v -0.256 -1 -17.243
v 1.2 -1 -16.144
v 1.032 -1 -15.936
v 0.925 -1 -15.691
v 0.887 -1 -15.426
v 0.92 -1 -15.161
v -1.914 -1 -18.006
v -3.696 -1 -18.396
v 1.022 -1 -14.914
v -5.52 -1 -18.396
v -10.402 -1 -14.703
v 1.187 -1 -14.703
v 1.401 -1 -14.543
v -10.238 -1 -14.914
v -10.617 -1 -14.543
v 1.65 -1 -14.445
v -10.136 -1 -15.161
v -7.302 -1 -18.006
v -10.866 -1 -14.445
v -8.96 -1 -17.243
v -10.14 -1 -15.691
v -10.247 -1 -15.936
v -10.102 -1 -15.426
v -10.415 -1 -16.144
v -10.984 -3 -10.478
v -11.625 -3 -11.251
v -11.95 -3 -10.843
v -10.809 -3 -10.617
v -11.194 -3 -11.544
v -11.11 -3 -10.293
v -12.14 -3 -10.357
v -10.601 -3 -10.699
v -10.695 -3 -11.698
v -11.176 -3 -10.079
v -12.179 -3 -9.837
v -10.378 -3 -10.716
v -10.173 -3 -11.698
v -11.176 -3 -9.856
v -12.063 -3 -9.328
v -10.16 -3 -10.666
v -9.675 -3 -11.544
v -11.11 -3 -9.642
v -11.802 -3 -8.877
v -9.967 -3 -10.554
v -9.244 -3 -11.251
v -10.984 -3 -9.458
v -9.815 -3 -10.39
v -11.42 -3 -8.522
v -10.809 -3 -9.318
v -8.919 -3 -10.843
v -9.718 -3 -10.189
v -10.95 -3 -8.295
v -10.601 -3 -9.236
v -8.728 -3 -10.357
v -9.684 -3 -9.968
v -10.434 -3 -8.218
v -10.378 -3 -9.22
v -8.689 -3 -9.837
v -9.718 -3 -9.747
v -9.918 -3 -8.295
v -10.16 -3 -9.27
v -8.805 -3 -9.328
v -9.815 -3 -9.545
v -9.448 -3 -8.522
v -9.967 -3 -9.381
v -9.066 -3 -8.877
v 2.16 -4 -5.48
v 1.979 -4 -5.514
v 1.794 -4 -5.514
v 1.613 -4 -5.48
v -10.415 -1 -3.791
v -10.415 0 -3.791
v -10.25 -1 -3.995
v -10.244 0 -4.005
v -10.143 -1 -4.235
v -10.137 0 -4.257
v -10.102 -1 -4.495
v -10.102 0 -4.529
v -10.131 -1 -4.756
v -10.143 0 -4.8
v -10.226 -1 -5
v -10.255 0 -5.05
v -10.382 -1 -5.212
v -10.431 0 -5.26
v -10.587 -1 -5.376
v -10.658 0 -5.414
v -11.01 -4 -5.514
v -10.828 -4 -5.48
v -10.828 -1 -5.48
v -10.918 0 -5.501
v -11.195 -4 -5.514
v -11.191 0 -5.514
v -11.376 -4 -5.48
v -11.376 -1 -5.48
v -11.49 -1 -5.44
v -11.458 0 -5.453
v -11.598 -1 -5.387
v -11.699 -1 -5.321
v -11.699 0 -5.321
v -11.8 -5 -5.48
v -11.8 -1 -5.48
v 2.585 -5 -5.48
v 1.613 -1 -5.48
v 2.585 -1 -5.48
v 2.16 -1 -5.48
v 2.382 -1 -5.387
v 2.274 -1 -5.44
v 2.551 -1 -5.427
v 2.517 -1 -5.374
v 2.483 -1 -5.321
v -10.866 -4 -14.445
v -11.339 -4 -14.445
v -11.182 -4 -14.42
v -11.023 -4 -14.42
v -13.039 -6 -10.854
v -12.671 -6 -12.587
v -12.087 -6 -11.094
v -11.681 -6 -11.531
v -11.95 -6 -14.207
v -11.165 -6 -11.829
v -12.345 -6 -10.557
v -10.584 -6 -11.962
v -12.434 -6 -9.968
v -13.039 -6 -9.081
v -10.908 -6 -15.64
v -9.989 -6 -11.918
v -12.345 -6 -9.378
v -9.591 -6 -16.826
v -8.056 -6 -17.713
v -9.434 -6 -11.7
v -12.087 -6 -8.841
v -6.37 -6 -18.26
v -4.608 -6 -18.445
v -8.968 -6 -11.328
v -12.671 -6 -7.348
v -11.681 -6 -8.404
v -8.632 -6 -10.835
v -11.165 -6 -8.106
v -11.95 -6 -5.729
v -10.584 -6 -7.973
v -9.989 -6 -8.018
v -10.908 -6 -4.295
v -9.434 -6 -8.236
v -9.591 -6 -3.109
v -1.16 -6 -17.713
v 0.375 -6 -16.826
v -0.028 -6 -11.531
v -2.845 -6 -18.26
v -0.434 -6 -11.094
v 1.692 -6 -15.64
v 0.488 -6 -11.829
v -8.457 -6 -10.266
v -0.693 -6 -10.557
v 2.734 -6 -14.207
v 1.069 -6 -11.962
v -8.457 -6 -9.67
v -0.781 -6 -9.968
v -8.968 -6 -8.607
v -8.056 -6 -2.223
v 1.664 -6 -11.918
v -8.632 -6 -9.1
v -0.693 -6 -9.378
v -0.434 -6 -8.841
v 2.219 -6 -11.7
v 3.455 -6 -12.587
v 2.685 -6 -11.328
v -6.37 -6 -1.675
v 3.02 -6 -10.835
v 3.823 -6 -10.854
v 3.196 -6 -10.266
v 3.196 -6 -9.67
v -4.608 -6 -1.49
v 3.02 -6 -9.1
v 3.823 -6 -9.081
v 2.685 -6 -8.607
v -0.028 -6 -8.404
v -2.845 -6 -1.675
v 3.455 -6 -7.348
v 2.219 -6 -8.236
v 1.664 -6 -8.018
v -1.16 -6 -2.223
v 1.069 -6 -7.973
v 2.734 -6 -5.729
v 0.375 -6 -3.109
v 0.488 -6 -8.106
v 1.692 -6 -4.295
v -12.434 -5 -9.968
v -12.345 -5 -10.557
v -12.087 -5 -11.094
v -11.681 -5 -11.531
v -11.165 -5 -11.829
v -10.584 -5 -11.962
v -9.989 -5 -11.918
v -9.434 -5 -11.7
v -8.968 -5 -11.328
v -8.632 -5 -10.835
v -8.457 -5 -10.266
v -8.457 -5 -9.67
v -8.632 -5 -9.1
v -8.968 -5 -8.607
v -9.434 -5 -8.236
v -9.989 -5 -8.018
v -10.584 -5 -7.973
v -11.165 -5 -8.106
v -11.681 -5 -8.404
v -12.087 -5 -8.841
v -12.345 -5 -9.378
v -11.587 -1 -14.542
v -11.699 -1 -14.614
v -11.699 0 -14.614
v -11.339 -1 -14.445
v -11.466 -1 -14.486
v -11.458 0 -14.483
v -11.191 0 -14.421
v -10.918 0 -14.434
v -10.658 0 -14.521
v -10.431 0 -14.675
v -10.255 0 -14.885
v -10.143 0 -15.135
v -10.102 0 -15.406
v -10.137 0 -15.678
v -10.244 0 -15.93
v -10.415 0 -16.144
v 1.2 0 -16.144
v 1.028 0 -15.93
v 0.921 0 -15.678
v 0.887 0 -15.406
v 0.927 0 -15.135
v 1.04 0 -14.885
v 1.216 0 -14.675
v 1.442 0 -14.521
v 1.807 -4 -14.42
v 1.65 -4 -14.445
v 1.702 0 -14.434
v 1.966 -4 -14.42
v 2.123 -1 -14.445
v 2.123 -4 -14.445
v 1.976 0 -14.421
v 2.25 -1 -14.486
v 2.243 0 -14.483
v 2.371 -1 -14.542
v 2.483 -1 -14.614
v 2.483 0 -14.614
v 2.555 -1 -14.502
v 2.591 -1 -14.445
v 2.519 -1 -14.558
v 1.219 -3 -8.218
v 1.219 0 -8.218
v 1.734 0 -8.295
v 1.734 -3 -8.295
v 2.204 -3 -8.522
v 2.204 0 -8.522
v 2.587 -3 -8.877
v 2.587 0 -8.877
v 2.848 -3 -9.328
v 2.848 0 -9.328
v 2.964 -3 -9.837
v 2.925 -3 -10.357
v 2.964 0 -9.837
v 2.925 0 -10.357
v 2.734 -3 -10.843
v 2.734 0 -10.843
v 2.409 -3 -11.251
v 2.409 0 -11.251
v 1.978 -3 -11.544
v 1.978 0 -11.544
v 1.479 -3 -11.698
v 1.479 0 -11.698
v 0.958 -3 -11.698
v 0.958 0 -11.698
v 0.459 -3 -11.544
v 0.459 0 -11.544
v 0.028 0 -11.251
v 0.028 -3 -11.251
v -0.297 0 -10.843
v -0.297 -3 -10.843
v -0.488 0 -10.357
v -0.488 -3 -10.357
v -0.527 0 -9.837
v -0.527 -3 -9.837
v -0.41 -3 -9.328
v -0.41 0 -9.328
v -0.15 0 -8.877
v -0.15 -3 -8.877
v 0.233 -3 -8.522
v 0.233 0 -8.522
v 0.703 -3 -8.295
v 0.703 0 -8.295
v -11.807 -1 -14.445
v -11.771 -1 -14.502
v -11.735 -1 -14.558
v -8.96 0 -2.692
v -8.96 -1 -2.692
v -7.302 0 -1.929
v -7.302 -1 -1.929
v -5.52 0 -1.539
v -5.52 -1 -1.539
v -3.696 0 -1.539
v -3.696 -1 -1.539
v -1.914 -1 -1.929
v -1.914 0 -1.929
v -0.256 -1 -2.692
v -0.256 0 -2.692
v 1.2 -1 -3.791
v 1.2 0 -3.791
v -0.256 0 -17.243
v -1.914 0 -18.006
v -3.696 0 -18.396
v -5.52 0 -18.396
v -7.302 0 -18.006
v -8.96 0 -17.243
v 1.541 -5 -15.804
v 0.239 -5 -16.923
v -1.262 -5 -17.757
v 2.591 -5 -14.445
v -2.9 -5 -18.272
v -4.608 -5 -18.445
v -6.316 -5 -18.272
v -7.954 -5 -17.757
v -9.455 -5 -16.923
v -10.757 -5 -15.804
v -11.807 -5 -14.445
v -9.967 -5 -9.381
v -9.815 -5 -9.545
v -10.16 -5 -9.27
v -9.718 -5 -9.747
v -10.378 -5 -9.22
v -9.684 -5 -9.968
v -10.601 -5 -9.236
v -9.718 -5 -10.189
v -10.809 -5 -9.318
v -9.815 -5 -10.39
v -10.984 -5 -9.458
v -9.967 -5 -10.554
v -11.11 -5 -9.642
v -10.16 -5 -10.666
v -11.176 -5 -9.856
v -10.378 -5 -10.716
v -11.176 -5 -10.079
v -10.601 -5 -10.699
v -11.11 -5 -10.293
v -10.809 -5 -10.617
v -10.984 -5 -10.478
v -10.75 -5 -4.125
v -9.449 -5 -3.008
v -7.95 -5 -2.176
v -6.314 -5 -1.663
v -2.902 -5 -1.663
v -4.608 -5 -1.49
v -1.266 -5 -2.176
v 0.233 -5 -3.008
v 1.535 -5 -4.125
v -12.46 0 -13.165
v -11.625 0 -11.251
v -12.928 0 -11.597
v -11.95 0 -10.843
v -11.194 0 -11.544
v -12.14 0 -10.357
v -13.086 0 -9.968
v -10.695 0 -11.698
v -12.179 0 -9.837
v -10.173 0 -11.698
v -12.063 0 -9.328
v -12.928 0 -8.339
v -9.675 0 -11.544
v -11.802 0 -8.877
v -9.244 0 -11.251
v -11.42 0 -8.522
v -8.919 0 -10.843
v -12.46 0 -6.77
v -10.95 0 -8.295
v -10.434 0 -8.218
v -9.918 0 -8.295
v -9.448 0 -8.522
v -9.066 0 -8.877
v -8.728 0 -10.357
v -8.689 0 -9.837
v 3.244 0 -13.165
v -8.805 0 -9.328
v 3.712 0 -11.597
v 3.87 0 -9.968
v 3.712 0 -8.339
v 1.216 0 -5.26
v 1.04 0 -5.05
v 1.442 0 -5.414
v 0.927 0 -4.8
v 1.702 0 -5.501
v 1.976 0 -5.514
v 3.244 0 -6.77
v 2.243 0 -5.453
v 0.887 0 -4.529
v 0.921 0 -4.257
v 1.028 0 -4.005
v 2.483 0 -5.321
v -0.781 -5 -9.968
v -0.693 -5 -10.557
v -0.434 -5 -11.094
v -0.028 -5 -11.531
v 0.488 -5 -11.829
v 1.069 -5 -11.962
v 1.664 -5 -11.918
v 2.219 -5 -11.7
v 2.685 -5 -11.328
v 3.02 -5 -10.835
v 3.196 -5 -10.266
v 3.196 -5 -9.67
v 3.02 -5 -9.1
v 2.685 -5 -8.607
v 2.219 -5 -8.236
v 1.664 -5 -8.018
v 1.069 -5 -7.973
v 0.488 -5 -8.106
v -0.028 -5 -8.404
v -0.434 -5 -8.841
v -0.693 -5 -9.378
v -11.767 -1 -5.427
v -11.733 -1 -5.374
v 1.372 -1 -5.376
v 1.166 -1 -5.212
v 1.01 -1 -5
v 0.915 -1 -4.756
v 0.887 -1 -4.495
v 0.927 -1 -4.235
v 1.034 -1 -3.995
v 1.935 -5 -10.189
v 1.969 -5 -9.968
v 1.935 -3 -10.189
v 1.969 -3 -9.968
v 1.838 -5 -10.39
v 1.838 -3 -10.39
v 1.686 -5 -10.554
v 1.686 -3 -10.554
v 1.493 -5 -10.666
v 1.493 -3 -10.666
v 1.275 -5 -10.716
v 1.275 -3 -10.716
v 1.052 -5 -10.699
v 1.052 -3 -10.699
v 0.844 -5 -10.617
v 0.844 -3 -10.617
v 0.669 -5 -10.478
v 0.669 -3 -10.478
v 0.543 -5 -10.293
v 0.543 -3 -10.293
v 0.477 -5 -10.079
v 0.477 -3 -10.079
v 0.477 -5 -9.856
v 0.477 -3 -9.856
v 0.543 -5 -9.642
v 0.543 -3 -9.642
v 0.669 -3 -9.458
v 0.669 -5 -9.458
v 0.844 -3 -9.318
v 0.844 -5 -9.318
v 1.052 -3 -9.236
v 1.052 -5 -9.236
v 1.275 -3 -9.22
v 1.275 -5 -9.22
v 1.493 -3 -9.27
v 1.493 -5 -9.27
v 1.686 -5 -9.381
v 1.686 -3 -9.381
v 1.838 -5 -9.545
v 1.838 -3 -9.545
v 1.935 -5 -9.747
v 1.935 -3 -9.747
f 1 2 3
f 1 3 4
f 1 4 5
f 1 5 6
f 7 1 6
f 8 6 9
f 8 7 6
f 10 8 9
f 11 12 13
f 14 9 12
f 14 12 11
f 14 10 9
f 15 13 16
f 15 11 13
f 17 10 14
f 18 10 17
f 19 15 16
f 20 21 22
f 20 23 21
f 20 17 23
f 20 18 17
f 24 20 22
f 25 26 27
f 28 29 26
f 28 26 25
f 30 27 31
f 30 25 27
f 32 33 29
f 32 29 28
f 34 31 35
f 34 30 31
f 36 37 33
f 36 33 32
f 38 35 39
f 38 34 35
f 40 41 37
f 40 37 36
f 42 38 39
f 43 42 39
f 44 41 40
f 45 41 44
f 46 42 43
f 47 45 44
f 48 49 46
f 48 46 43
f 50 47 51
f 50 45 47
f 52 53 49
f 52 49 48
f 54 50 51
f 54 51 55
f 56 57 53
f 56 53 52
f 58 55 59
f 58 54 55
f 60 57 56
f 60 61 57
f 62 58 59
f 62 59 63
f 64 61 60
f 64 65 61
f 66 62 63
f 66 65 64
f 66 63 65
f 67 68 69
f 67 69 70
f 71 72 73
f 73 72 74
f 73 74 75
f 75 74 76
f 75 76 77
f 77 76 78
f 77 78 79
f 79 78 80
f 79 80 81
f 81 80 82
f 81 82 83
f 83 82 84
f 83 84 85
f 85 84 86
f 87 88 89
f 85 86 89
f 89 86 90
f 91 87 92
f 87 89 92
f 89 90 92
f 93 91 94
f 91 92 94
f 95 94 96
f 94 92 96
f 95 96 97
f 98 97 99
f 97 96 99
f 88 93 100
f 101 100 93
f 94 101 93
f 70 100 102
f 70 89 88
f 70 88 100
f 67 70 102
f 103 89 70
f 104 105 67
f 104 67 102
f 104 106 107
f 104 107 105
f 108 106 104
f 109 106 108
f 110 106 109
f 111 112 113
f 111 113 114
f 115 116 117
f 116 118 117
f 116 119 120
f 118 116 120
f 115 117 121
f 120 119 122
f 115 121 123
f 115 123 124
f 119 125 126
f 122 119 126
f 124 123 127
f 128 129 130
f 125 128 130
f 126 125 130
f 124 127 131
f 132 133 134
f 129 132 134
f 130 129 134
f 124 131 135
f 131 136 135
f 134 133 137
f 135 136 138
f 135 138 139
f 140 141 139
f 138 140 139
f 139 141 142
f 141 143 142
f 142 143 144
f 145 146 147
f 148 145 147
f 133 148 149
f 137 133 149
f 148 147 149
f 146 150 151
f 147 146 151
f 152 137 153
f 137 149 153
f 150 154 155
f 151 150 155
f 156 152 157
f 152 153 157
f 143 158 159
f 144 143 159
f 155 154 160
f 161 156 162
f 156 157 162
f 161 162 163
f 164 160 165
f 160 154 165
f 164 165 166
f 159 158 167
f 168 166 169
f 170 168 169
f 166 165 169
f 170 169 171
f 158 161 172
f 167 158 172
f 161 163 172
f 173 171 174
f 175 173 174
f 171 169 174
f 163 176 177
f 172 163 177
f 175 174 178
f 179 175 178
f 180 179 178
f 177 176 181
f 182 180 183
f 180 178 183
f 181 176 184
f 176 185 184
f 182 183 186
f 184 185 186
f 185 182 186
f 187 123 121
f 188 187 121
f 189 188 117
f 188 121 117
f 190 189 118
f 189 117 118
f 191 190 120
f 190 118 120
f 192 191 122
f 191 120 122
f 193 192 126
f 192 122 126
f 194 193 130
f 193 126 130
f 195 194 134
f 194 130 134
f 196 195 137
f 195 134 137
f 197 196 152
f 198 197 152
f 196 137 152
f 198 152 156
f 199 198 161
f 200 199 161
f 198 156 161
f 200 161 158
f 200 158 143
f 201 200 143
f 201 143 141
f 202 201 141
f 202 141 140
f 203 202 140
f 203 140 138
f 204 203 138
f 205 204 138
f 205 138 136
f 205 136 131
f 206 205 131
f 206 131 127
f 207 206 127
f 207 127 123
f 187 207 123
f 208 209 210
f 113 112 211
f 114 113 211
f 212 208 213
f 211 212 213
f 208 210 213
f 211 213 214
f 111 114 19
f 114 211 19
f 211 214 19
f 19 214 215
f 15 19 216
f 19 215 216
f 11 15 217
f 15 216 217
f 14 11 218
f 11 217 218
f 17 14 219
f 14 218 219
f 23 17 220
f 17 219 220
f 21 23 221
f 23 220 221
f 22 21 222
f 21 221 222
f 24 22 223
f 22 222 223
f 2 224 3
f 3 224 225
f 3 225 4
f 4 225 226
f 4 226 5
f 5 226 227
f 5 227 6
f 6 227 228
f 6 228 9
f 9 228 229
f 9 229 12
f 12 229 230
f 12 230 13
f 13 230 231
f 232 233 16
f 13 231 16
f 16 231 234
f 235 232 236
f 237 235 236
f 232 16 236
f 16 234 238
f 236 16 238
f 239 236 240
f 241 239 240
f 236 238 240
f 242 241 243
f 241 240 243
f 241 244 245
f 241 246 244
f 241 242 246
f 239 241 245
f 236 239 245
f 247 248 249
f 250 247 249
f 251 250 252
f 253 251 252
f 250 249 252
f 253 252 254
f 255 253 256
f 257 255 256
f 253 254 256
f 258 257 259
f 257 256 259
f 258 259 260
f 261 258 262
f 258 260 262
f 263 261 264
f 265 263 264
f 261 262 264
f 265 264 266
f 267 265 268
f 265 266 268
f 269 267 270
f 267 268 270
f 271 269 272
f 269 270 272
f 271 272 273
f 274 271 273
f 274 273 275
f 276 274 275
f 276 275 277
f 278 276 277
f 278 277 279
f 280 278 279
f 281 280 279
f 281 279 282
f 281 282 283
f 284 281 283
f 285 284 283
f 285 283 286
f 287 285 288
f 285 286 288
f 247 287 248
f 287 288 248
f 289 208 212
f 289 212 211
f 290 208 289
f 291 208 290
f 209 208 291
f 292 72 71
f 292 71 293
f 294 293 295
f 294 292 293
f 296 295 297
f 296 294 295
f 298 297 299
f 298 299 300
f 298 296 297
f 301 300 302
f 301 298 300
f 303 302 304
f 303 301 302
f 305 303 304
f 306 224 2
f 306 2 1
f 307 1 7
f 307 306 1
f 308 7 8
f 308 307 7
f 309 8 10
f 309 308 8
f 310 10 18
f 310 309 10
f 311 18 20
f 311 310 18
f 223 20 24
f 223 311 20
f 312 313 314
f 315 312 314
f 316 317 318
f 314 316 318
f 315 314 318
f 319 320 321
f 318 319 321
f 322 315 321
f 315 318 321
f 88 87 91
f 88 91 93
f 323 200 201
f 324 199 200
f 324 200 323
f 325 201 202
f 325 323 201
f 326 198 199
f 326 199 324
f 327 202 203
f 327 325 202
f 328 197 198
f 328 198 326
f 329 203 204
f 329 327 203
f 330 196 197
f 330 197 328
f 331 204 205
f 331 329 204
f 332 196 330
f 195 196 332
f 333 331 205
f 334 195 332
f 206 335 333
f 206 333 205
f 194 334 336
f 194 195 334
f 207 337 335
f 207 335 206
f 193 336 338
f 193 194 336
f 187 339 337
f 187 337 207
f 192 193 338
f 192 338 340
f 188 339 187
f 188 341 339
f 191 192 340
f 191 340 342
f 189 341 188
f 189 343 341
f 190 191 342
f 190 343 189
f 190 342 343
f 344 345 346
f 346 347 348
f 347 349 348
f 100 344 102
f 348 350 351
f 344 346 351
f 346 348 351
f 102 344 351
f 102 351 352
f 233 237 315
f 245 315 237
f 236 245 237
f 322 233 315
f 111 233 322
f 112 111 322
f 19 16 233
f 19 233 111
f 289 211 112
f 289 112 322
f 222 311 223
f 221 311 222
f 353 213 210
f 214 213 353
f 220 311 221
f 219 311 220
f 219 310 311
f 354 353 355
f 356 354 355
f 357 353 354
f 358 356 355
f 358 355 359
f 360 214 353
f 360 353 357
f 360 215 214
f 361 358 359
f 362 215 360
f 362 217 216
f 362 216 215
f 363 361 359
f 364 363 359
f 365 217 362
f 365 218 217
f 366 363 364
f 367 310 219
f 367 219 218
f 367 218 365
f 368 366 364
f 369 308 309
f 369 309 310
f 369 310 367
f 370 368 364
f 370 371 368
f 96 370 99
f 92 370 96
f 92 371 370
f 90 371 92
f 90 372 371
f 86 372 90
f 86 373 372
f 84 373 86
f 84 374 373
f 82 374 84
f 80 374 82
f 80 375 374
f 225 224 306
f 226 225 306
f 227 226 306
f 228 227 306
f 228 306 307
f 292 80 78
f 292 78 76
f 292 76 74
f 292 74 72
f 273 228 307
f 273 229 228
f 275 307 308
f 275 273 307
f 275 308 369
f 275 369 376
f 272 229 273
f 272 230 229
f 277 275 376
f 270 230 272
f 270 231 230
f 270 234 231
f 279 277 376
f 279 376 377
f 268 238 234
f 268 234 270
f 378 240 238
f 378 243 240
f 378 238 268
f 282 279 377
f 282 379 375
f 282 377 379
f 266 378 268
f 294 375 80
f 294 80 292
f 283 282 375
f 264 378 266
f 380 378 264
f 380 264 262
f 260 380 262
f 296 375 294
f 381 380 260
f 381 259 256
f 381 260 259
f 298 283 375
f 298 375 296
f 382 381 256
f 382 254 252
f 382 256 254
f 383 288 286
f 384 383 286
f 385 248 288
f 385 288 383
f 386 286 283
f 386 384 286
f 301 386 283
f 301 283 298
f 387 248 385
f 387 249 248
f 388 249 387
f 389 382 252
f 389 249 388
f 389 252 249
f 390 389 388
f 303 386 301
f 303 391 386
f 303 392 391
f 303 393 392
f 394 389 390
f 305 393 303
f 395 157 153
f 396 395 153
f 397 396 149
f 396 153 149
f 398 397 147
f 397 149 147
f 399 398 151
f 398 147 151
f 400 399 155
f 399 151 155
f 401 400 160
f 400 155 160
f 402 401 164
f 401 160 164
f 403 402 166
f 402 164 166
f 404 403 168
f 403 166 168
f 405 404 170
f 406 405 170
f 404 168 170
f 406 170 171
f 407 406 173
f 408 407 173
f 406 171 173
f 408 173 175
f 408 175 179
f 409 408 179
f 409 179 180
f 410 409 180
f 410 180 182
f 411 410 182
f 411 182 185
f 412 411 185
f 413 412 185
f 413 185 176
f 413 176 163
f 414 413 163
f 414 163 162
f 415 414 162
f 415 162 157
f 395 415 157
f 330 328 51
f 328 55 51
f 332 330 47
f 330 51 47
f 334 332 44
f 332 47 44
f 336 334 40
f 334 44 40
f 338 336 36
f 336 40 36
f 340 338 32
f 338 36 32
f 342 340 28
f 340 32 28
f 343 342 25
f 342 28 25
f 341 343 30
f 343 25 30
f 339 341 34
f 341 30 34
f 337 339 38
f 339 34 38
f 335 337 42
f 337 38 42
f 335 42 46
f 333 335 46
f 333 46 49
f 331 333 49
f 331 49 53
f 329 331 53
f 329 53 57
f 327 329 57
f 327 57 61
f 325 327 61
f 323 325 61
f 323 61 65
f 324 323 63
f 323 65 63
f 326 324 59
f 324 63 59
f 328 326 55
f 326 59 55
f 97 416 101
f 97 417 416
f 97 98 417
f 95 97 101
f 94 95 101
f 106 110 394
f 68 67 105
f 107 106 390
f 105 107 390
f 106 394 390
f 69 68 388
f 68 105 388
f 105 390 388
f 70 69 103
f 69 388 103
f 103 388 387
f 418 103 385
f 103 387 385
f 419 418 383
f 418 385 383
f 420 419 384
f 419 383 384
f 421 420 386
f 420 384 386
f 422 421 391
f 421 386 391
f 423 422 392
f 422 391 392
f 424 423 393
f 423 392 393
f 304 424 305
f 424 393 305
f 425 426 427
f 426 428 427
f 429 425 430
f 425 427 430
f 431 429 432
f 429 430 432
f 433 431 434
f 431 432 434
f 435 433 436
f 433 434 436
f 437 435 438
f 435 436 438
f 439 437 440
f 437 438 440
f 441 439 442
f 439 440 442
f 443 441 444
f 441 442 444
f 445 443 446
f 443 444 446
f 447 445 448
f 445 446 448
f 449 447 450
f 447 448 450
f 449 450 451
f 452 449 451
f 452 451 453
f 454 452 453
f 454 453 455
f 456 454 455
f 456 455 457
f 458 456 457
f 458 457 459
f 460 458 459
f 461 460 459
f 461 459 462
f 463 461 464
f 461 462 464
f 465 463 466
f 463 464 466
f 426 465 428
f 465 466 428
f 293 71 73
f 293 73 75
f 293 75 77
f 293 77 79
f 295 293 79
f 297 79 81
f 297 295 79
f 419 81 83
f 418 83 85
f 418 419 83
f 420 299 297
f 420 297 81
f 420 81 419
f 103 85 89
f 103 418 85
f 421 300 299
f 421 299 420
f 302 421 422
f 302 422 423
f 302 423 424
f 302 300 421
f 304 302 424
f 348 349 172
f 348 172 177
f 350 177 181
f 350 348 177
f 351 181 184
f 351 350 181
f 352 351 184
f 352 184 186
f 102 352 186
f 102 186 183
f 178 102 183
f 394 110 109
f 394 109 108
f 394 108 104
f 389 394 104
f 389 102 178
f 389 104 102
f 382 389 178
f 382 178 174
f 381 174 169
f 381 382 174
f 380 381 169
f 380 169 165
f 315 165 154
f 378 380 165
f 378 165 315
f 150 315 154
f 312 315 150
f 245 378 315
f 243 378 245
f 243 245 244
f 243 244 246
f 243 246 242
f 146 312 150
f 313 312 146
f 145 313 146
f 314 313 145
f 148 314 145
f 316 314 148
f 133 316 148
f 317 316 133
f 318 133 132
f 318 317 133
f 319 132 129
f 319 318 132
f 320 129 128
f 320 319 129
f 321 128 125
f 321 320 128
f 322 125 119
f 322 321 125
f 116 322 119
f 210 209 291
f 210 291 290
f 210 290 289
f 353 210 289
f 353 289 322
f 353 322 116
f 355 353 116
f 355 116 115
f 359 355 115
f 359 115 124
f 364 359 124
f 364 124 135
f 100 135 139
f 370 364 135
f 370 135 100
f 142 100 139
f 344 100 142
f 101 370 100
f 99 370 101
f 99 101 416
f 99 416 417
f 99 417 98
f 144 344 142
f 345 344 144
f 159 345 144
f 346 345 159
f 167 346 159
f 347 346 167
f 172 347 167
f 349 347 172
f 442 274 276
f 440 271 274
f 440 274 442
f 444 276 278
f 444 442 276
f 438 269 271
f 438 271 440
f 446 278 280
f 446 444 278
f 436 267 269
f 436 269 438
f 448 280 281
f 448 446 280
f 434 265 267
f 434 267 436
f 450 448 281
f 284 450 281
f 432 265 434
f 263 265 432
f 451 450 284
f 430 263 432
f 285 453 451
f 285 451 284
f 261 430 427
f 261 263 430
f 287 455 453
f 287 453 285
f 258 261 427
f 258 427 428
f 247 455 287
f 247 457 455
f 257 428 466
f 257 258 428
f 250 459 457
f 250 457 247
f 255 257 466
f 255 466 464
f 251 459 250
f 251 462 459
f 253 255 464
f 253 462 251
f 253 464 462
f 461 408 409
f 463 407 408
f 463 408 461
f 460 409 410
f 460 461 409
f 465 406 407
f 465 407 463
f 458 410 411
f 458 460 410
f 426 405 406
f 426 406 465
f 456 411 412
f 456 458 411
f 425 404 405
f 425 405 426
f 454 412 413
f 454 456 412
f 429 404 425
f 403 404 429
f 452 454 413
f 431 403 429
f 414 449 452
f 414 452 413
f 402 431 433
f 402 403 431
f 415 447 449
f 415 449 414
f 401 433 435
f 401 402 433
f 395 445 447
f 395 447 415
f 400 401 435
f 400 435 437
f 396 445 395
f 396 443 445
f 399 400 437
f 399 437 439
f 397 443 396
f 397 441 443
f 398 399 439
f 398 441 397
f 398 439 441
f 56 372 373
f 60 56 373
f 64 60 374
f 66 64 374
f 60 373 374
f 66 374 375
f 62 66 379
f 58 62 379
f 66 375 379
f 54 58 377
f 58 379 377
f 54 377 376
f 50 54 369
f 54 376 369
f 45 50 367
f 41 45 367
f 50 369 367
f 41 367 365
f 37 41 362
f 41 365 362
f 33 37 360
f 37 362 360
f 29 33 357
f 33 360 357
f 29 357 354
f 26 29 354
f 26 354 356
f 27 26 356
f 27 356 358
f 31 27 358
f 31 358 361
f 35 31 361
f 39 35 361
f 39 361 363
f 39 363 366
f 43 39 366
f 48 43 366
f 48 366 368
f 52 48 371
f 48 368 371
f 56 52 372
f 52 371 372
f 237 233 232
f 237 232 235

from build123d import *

# Parameters (mm, degrees)
SKETCH1_R                               = 8.477787946
BOSS_EXTRUDE1_DEPTH                     = 6
SKETCH2_R                               = 1.75
CUT_EXTRUDE1_DEPTH                      = 3
CBORE_FOR_M5_HEX_HEAD_BOLT1_D           = 1.5
CBORE_FOR_M5_HEX_HEAD_BOLT1_CBORE_D     = 4
CBORE_FOR_M5_HEX_HEAD_BOLT1_CBORE_DEPTH = 1
CUT_EXTRUDE6_START                      = -1.48
SKETCH10_W                              = 21.455120181
SKETCH10_H                              = 4
CUT_EXTRUDE6_DEPTH                      = 4
SKETCH12_W                              = 22.336955322
SKETCH12_H                              = 4
CUT_EXTRUDE7_DEPTH                      = 4
SKETCH13_R                              = 1
CUT_EXTRUDE8_DEPTH                      = 4


with BuildPart() as part:
    # Sketch1 → Boss-Extrude1 (new body)
    with BuildSketch(Plane(origin=(0, 0, 0), x_dir=(1, 0, 0), z_dir=(0, 1, 0))):
        with Locations(Location((-4.607856835, 9.967667798, 0), (0, 0, 270))):
            Circle(SKETCH1_R)
    extrude(amount=-BOSS_EXTRUDE1_DEPTH)

    # Sketch2 → Cut-Extrude1 (cut)
    with BuildSketch(Plane(origin=(0, 0, 0), x_dir=(1, 0, 0), z_dir=(0, 1, 0))):
        with Locations(Location((-10.434250808, 9.967667798, 0), (0, 0, 270))):
            Circle(SKETCH2_R)
        with Locations(Location((1.218537138, 9.967667798, 0), (0, 0, 270))):
            Circle(SKETCH2_R)
    extrude(amount=-CUT_EXTRUDE1_DEPTH, mode=Mode.SUBTRACT)

    # CBORE for M5 Hex Head Bolt1 (through all)
    with Locations(Plane(origin=(0, -6, 0), x_dir=(-1, 0, 0), z_dir=(0, -1, 0))):
        with Locations((10.434250808, 9.967667798), (-1.218537138, 9.967667798)):
            CounterBoreHole(CBORE_FOR_M5_HEX_HEAD_BOLT1_D / 2, CBORE_FOR_M5_HEX_HEAD_BOLT1_CBORE_D / 2, CBORE_FOR_M5_HEX_HEAD_BOLT1_CBORE_DEPTH)

    # Sketch10 → Cut-Extrude6 (cut)
    with BuildSketch(Plane.XY.offset(CUT_EXTRUDE6_START)):
        with Locations((-4.34718715, -3)):
            Rectangle(SKETCH10_W, SKETCH10_H)
    extrude(amount=-CUT_EXTRUDE6_DEPTH, mode=Mode.SUBTRACT)

    # Sketch12 → Cut-Extrude7 (cut)
    with BuildSketch(Plane(origin=(0, 0, -18.445455745), x_dir=(-1, 0, 0), z_dir=(0, 0, -1))):
        with Locations((4.129052905, -3)):
            Rectangle(SKETCH12_W, SKETCH12_H)
    extrude(amount=-CUT_EXTRUDE7_DEPTH, mode=Mode.SUBTRACT)

    # Sketch13 → Cut-Extrude8 (cut)
    with BuildSketch(Plane(origin=(0, 0, 0), x_dir=(1, 0, 0), z_dir=(0, 1, 0))):
        with Locations((1.886505511, 4.518250749)):
            Circle(SKETCH13_R)
        with Locations((-11.102219182, 4.518250749)):
            Circle(SKETCH13_R)
        with Locations((-11.102219182, 15.417084848)):
            Circle(SKETCH13_R)
        with Locations((1.886505511, 15.417084848)):
            Circle(SKETCH13_R)
    extrude(amount=-CUT_EXTRUDE8_DEPTH, mode=Mode.SUBTRACT)


solid = part.part
